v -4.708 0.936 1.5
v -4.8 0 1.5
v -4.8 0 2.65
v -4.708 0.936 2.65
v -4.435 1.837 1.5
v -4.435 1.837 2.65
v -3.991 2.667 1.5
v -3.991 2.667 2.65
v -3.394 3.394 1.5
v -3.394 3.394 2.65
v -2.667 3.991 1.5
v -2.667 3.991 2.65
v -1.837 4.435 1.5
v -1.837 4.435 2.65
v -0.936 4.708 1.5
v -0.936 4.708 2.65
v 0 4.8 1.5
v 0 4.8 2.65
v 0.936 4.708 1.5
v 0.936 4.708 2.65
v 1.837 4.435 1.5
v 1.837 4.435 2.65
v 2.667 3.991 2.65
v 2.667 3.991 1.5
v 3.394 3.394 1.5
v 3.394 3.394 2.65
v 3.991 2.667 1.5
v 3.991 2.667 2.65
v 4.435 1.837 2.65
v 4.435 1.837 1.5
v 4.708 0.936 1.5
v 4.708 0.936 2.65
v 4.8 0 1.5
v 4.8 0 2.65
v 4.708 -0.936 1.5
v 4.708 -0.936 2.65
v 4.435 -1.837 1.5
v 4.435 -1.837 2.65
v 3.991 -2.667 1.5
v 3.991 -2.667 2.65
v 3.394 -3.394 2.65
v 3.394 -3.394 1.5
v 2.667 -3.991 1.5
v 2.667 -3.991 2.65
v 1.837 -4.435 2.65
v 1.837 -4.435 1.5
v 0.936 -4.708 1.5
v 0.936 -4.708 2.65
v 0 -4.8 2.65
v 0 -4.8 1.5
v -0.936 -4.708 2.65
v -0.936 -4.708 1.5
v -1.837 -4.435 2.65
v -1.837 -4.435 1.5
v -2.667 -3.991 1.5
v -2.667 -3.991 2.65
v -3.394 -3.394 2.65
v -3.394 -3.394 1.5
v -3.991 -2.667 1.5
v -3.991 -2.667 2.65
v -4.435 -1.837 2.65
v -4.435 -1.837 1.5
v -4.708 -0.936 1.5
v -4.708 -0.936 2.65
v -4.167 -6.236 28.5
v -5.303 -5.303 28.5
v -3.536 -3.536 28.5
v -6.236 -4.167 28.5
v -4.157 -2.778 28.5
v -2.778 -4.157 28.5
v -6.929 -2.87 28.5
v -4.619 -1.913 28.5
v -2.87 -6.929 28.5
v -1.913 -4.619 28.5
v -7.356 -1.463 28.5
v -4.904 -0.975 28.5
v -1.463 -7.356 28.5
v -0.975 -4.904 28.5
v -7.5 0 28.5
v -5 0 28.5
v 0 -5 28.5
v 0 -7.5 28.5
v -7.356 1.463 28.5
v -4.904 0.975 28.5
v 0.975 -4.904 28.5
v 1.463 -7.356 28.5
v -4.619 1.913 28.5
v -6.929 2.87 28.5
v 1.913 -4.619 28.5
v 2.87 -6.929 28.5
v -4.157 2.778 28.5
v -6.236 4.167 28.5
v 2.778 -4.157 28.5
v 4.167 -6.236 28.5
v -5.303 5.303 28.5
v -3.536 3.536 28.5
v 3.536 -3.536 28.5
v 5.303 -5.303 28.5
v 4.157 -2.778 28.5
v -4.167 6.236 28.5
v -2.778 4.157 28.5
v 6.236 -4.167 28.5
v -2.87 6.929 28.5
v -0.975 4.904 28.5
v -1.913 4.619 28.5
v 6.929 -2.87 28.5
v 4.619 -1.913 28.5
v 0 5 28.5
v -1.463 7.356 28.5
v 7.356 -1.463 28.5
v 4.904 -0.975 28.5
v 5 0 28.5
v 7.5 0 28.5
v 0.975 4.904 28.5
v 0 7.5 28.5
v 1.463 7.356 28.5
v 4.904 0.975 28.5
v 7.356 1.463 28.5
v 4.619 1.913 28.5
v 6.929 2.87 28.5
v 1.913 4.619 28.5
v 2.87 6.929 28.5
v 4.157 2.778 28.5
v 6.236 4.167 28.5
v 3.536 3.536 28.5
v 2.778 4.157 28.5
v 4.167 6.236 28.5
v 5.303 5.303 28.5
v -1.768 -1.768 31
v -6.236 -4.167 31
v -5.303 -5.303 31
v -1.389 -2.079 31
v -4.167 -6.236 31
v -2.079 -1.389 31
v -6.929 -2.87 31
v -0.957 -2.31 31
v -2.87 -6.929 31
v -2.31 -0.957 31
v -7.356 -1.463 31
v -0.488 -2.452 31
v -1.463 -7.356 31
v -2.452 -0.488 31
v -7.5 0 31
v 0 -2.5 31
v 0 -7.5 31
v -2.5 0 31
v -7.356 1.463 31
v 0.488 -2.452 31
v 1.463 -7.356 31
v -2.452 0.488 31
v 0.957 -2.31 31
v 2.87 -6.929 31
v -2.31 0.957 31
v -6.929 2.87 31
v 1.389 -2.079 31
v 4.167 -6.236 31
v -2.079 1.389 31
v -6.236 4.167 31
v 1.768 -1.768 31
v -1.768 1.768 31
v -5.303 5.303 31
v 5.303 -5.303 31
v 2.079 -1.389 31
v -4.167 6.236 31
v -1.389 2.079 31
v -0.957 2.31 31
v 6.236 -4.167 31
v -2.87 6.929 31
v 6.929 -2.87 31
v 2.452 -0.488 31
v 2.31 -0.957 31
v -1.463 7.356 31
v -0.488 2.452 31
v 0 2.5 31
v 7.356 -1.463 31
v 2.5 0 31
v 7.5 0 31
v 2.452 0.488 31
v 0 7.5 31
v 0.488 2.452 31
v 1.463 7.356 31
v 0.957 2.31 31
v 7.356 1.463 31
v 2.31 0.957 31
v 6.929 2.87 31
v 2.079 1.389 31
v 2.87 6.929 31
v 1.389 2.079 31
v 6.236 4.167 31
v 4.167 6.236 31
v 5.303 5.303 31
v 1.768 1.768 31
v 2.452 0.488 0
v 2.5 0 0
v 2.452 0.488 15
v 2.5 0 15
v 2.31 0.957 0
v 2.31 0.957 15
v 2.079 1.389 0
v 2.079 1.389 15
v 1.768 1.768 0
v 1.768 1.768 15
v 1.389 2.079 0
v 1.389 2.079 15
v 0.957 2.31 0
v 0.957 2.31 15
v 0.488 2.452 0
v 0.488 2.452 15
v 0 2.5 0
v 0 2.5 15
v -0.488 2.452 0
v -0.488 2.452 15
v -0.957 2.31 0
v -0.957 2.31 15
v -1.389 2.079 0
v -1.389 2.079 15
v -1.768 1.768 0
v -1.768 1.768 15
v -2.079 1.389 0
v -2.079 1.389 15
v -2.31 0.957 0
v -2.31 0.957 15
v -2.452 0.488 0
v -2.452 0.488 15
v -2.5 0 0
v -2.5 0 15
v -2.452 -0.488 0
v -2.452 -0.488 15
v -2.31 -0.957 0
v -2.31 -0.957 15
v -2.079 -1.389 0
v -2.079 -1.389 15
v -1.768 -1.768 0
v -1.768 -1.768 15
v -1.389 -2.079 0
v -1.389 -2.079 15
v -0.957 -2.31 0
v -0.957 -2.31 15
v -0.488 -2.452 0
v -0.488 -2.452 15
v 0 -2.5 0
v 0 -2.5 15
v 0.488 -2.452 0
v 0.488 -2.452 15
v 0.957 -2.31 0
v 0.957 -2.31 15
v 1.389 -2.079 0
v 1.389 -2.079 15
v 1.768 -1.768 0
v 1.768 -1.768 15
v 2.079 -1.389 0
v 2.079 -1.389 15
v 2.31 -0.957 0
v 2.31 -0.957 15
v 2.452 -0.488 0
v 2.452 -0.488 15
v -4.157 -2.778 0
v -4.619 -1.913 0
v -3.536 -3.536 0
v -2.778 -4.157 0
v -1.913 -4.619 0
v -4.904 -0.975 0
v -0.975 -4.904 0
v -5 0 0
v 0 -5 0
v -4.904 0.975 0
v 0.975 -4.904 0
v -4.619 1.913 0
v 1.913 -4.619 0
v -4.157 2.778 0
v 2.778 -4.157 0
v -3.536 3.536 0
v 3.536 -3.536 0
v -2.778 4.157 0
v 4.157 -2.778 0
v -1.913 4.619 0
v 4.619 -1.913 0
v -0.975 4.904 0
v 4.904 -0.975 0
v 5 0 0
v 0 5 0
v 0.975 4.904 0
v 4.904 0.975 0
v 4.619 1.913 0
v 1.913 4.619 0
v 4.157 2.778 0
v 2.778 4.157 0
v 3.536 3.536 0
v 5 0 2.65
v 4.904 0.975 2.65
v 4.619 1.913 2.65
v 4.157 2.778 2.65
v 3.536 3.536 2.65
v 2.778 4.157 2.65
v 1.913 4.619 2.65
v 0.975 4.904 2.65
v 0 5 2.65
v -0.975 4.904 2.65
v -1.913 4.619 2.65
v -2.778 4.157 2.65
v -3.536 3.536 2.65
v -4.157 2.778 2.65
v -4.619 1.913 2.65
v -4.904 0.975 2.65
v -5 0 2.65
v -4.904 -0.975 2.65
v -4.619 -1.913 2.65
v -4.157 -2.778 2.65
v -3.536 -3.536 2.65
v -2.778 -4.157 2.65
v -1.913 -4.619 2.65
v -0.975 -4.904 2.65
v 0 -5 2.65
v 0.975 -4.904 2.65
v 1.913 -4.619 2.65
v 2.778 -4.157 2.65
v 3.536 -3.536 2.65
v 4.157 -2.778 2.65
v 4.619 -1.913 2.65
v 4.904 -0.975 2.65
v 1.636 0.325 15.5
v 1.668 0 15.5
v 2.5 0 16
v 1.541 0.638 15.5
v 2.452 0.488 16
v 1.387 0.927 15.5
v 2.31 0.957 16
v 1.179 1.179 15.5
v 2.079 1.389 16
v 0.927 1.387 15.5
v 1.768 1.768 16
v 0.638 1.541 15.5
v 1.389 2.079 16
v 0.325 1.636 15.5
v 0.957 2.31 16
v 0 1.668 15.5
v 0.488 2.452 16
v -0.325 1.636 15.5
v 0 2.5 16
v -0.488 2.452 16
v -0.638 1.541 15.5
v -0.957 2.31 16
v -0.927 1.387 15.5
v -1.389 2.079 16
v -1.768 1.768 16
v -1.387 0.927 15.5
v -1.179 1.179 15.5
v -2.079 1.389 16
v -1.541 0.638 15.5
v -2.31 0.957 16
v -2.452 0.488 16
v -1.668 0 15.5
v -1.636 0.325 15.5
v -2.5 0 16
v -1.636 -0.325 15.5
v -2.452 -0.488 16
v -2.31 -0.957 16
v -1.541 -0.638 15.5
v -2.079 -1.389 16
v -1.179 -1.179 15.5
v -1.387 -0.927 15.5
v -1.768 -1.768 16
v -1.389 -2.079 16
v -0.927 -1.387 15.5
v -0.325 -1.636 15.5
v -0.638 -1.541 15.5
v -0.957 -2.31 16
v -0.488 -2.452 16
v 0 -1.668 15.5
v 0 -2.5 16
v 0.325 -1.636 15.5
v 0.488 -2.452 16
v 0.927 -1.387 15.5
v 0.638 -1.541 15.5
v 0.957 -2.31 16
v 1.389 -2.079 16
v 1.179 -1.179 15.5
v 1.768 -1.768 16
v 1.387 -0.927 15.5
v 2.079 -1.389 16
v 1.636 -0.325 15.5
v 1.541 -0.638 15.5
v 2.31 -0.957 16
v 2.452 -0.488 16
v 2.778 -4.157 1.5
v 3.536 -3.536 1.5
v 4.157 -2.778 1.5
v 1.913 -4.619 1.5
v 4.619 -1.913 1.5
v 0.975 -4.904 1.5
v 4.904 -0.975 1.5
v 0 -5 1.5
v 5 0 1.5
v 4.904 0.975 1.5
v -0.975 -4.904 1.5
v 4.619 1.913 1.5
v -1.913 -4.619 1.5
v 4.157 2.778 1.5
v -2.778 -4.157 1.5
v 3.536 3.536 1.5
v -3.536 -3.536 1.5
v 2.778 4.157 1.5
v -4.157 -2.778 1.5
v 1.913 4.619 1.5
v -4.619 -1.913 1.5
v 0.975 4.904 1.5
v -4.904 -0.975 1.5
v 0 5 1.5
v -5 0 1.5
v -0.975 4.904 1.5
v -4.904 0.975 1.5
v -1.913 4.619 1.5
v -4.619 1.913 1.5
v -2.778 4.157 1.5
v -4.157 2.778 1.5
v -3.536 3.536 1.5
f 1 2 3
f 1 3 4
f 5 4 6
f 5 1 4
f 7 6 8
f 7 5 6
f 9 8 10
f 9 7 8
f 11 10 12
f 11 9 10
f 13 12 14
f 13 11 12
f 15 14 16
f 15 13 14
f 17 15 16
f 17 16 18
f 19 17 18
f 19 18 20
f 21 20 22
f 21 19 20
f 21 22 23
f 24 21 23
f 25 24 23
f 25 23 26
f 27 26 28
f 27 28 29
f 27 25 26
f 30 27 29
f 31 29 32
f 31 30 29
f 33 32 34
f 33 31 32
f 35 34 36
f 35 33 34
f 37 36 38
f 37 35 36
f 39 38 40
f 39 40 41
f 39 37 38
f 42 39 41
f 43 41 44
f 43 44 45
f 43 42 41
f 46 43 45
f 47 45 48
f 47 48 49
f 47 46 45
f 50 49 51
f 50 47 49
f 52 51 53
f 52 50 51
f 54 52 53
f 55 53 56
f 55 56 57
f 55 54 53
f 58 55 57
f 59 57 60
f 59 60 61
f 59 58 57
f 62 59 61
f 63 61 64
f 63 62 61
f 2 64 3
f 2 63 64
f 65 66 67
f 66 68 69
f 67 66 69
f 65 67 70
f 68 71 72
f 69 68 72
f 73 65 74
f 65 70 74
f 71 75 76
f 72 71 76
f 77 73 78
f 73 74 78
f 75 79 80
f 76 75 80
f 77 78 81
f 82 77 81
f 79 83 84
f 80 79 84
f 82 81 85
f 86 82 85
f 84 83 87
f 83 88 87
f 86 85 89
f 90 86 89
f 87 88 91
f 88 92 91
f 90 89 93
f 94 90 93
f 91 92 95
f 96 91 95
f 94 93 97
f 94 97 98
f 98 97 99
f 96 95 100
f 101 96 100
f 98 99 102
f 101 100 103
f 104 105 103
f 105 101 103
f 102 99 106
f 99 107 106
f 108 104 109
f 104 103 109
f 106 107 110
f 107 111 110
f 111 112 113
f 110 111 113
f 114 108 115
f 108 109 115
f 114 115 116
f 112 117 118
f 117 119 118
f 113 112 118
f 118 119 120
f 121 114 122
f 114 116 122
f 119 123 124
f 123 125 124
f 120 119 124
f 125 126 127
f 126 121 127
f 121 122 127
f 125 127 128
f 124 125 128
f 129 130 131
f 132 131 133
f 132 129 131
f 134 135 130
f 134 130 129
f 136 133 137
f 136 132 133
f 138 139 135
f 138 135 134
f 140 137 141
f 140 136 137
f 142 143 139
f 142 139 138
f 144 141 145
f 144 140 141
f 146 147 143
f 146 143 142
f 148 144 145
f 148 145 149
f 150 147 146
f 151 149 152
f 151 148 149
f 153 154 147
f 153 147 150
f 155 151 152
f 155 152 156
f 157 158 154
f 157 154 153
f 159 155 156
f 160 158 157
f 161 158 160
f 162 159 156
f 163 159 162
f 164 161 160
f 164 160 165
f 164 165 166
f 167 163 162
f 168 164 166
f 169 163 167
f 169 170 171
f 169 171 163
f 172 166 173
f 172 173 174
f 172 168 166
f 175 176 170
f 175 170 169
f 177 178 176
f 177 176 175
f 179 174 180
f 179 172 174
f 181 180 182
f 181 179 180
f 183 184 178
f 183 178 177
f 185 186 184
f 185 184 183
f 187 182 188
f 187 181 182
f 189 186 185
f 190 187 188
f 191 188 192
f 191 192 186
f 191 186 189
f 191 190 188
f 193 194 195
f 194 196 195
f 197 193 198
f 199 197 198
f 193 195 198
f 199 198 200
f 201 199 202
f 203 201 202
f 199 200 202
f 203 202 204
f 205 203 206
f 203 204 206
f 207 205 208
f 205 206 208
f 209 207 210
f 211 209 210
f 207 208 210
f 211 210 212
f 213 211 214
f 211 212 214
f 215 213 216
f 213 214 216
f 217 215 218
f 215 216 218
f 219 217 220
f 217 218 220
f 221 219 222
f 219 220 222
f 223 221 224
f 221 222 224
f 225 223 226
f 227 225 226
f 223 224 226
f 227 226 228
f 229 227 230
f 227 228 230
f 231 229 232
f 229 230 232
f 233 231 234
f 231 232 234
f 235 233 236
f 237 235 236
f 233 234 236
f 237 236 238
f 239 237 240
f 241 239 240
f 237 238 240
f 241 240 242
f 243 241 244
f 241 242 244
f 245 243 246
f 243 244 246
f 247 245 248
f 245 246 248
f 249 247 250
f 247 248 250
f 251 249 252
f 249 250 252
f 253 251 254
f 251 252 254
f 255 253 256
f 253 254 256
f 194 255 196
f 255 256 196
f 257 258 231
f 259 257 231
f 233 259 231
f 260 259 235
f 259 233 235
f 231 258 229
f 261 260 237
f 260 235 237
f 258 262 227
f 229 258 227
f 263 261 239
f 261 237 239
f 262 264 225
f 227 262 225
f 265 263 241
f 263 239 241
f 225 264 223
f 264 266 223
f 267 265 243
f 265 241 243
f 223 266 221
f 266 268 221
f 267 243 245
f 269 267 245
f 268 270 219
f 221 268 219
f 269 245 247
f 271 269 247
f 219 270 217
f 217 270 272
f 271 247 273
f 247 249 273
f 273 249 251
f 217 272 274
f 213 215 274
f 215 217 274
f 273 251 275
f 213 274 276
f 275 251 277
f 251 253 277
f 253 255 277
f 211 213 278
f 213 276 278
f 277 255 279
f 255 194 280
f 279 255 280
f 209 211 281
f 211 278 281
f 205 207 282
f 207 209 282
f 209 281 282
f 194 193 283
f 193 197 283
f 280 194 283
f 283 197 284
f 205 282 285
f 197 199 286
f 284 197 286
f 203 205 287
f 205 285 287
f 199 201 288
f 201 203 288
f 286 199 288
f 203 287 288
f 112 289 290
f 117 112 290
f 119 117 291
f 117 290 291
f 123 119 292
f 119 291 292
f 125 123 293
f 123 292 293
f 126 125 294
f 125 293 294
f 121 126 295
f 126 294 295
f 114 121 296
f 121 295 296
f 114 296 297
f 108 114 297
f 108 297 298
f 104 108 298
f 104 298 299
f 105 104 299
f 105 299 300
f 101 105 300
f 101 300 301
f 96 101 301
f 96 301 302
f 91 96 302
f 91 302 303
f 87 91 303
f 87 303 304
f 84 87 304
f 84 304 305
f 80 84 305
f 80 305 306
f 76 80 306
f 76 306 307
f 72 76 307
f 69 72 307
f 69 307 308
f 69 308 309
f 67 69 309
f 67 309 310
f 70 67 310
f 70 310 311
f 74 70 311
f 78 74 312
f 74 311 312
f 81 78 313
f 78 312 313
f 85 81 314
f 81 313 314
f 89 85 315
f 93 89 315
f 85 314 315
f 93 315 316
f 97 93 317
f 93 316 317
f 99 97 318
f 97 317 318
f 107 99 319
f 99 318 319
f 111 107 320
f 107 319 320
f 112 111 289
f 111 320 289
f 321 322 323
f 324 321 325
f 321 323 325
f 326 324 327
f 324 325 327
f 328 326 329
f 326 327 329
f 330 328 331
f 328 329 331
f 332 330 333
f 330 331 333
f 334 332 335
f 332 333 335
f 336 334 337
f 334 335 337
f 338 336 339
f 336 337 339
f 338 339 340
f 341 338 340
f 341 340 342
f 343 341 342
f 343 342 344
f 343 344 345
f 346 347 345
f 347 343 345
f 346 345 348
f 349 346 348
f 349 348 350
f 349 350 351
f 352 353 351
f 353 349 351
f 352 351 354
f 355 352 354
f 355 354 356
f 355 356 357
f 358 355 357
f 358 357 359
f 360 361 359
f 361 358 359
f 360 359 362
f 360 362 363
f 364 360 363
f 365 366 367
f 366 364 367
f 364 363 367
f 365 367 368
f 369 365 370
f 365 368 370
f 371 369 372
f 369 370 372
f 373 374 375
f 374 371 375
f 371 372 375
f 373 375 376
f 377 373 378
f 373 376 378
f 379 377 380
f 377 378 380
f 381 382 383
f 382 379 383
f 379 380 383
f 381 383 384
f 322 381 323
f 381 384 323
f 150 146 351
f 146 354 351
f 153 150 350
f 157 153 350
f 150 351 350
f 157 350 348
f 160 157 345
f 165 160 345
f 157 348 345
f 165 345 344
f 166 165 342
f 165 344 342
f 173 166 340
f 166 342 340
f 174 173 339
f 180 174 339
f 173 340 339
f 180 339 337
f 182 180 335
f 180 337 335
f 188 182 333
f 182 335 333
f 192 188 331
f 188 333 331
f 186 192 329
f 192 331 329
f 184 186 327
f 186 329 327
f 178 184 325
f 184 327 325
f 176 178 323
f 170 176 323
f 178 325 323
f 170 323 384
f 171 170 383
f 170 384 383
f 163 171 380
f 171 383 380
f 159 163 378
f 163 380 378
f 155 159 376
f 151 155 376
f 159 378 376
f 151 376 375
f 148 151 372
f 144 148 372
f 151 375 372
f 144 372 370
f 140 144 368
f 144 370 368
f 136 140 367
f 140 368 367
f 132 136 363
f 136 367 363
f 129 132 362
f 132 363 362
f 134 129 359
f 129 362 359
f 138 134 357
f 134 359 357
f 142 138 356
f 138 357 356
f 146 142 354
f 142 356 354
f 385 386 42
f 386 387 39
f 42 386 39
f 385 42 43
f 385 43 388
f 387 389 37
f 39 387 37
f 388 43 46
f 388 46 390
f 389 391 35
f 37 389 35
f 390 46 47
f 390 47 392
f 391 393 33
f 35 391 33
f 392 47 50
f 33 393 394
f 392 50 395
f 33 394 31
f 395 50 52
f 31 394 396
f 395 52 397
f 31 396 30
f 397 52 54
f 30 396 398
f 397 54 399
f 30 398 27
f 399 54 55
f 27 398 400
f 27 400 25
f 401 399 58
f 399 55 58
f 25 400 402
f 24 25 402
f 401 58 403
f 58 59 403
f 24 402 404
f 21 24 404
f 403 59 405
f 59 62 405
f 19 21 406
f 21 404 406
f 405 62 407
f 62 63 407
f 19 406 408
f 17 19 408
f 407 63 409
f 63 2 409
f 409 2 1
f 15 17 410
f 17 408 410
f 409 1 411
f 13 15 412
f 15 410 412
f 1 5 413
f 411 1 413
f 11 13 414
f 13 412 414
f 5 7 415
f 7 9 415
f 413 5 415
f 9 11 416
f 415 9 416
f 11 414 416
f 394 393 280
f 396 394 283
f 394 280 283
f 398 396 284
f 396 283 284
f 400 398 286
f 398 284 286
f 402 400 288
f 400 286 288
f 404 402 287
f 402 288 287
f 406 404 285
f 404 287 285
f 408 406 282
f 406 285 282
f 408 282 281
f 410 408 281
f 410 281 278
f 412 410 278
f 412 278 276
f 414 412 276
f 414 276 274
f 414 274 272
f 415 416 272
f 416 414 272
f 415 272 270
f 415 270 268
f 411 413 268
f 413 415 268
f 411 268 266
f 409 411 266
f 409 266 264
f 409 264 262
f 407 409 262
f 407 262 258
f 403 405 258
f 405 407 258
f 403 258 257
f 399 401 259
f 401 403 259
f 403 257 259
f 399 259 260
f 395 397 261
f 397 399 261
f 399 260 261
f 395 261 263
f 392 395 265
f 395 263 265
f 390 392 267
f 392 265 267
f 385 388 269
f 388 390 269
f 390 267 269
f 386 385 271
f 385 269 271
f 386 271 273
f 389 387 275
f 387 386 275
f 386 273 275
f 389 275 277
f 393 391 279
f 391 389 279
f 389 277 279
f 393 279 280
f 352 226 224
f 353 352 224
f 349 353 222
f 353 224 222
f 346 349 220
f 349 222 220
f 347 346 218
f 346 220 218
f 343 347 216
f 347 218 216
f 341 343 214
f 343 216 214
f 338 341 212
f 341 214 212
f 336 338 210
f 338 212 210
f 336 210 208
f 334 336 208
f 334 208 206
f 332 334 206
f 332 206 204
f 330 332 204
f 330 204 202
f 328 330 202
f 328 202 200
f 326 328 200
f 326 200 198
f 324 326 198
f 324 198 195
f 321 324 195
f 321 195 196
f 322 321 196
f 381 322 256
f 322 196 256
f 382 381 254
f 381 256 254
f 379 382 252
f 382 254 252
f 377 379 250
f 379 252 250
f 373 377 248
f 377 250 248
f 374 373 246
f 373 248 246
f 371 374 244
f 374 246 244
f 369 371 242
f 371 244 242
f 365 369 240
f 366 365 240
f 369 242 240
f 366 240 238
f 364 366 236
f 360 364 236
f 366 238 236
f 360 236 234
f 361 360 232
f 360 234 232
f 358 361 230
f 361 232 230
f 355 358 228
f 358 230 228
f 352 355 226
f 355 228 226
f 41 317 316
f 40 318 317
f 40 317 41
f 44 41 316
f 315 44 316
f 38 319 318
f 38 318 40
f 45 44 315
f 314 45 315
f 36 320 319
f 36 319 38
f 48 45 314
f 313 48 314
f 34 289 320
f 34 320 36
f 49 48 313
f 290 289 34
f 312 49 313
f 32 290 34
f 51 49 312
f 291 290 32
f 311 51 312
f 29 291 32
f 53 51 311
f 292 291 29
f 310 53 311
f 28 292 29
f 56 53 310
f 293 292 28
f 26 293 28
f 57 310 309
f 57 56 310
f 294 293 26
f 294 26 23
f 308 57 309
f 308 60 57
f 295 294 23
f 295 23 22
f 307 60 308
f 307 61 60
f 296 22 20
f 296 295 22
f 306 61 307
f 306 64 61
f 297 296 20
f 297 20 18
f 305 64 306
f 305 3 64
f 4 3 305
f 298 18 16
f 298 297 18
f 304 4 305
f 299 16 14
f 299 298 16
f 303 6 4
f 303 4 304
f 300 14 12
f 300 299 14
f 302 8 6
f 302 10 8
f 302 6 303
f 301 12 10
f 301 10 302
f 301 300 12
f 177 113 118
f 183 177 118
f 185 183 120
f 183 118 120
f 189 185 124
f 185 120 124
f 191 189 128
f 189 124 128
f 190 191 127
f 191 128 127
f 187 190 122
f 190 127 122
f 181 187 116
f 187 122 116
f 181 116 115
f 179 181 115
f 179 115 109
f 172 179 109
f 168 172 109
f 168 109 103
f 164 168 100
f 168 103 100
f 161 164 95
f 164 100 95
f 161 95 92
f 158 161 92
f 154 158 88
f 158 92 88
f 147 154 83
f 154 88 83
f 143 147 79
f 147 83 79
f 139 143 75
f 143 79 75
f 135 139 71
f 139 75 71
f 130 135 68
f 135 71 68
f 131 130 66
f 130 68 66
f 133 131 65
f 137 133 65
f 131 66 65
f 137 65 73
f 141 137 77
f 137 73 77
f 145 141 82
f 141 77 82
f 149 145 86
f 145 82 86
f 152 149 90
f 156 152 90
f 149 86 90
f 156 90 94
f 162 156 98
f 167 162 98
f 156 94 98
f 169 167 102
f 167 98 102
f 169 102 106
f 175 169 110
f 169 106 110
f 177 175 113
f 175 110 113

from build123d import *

# Parameters (mm, degrees)
SKIZZE1_R                       = 5
AUFSATZ_LINEAR_AUSTRAGEN1_DEPTH = 31
M6_GEWINDEBOHRUNG1_D            = 5
M6_GEWINDEBOHRUNG1_DEPTH        = 15
M6_GEWINDEBOHRUNG1_TIP          = 1.502151548
M6_GEWINDEBOHRUNG2_D            = 5
M6_GEWINDEBOHRUNG2_DEPTH        = 15
M6_GEWINDEBOHRUNG2_TIP          = 1.502151548
AUFSATZ_LINEAR_START            = -2.5
SKIZZE8_R                       = 7.5
SKIZZE8_R_2                     = 5
AUFSATZ_LINEAR_AUSTRAGEN3_DEPTH = 2.5
SKIZZE9_R                       = 5.404643903
SKIZZE9_R_2                     = 4.8
SCHNITT_LINEAR_AUSTRAGEN1_DEPTH = 1.15


with BuildPart() as part:
    # Skizze1 → Aufsatz-Linear austragen1 (new body)
    with BuildSketch(Plane.XY):
        Circle(SKIZZE1_R)
    extrude(amount=AUFSATZ_LINEAR_AUSTRAGEN1_DEPTH)

    # M6 Gewindebohrung1
    with Locations(Plane(origin=(0, 0, 0), x_dir=(-1, 0, 0), z_dir=(0, 0, -1))):
        with Locations((0, 0)):
            Hole(M6_GEWINDEBOHRUNG1_D / 2, depth=M6_GEWINDEBOHRUNG1_DEPTH)
            with Locations((0, 0, -(M6_GEWINDEBOHRUNG1_DEPTH + M6_GEWINDEBOHRUNG1_TIP / 2))):  # 118° drill point
                Cone(0, M6_GEWINDEBOHRUNG1_D / 2, M6_GEWINDEBOHRUNG1_TIP, mode=Mode.SUBTRACT)

    # M6 Gewindebohrung2
    with Locations(Plane.XY.offset(31)):
        with Locations((0, 0)):
            Hole(M6_GEWINDEBOHRUNG2_D / 2, depth=M6_GEWINDEBOHRUNG2_DEPTH)
            with Locations((0, 0, -(M6_GEWINDEBOHRUNG2_DEPTH + M6_GEWINDEBOHRUNG2_TIP / 2))):  # 118° drill point
                Cone(0, M6_GEWINDEBOHRUNG2_D / 2, M6_GEWINDEBOHRUNG2_TIP, mode=Mode.SUBTRACT)

    # Skizze8 → Aufsatz-Linear austragen3 (add)
    with BuildSketch(Plane.XY.offset(31).offset(AUFSATZ_LINEAR_START)):
        Circle(SKIZZE8_R)
        Circle(SKIZZE8_R_2, mode=Mode.SUBTRACT)
    extrude(amount=AUFSATZ_LINEAR_AUSTRAGEN3_DEPTH)

    # Skizze9 → Schnitt-Linear austragen1 (cut)
    with BuildSketch(Plane(origin=(0, 0, 1.5), x_dir=(-1, 0, 0), z_dir=(0, 0, -1))):
        Circle(SKIZZE9_R)
        Circle(SKIZZE9_R_2, mode=Mode.SUBTRACT)
    extrude(amount=-SCHNITT_LINEAR_AUSTRAGEN1_DEPTH, mode=Mode.SUBTRACT)


solid = part.part
